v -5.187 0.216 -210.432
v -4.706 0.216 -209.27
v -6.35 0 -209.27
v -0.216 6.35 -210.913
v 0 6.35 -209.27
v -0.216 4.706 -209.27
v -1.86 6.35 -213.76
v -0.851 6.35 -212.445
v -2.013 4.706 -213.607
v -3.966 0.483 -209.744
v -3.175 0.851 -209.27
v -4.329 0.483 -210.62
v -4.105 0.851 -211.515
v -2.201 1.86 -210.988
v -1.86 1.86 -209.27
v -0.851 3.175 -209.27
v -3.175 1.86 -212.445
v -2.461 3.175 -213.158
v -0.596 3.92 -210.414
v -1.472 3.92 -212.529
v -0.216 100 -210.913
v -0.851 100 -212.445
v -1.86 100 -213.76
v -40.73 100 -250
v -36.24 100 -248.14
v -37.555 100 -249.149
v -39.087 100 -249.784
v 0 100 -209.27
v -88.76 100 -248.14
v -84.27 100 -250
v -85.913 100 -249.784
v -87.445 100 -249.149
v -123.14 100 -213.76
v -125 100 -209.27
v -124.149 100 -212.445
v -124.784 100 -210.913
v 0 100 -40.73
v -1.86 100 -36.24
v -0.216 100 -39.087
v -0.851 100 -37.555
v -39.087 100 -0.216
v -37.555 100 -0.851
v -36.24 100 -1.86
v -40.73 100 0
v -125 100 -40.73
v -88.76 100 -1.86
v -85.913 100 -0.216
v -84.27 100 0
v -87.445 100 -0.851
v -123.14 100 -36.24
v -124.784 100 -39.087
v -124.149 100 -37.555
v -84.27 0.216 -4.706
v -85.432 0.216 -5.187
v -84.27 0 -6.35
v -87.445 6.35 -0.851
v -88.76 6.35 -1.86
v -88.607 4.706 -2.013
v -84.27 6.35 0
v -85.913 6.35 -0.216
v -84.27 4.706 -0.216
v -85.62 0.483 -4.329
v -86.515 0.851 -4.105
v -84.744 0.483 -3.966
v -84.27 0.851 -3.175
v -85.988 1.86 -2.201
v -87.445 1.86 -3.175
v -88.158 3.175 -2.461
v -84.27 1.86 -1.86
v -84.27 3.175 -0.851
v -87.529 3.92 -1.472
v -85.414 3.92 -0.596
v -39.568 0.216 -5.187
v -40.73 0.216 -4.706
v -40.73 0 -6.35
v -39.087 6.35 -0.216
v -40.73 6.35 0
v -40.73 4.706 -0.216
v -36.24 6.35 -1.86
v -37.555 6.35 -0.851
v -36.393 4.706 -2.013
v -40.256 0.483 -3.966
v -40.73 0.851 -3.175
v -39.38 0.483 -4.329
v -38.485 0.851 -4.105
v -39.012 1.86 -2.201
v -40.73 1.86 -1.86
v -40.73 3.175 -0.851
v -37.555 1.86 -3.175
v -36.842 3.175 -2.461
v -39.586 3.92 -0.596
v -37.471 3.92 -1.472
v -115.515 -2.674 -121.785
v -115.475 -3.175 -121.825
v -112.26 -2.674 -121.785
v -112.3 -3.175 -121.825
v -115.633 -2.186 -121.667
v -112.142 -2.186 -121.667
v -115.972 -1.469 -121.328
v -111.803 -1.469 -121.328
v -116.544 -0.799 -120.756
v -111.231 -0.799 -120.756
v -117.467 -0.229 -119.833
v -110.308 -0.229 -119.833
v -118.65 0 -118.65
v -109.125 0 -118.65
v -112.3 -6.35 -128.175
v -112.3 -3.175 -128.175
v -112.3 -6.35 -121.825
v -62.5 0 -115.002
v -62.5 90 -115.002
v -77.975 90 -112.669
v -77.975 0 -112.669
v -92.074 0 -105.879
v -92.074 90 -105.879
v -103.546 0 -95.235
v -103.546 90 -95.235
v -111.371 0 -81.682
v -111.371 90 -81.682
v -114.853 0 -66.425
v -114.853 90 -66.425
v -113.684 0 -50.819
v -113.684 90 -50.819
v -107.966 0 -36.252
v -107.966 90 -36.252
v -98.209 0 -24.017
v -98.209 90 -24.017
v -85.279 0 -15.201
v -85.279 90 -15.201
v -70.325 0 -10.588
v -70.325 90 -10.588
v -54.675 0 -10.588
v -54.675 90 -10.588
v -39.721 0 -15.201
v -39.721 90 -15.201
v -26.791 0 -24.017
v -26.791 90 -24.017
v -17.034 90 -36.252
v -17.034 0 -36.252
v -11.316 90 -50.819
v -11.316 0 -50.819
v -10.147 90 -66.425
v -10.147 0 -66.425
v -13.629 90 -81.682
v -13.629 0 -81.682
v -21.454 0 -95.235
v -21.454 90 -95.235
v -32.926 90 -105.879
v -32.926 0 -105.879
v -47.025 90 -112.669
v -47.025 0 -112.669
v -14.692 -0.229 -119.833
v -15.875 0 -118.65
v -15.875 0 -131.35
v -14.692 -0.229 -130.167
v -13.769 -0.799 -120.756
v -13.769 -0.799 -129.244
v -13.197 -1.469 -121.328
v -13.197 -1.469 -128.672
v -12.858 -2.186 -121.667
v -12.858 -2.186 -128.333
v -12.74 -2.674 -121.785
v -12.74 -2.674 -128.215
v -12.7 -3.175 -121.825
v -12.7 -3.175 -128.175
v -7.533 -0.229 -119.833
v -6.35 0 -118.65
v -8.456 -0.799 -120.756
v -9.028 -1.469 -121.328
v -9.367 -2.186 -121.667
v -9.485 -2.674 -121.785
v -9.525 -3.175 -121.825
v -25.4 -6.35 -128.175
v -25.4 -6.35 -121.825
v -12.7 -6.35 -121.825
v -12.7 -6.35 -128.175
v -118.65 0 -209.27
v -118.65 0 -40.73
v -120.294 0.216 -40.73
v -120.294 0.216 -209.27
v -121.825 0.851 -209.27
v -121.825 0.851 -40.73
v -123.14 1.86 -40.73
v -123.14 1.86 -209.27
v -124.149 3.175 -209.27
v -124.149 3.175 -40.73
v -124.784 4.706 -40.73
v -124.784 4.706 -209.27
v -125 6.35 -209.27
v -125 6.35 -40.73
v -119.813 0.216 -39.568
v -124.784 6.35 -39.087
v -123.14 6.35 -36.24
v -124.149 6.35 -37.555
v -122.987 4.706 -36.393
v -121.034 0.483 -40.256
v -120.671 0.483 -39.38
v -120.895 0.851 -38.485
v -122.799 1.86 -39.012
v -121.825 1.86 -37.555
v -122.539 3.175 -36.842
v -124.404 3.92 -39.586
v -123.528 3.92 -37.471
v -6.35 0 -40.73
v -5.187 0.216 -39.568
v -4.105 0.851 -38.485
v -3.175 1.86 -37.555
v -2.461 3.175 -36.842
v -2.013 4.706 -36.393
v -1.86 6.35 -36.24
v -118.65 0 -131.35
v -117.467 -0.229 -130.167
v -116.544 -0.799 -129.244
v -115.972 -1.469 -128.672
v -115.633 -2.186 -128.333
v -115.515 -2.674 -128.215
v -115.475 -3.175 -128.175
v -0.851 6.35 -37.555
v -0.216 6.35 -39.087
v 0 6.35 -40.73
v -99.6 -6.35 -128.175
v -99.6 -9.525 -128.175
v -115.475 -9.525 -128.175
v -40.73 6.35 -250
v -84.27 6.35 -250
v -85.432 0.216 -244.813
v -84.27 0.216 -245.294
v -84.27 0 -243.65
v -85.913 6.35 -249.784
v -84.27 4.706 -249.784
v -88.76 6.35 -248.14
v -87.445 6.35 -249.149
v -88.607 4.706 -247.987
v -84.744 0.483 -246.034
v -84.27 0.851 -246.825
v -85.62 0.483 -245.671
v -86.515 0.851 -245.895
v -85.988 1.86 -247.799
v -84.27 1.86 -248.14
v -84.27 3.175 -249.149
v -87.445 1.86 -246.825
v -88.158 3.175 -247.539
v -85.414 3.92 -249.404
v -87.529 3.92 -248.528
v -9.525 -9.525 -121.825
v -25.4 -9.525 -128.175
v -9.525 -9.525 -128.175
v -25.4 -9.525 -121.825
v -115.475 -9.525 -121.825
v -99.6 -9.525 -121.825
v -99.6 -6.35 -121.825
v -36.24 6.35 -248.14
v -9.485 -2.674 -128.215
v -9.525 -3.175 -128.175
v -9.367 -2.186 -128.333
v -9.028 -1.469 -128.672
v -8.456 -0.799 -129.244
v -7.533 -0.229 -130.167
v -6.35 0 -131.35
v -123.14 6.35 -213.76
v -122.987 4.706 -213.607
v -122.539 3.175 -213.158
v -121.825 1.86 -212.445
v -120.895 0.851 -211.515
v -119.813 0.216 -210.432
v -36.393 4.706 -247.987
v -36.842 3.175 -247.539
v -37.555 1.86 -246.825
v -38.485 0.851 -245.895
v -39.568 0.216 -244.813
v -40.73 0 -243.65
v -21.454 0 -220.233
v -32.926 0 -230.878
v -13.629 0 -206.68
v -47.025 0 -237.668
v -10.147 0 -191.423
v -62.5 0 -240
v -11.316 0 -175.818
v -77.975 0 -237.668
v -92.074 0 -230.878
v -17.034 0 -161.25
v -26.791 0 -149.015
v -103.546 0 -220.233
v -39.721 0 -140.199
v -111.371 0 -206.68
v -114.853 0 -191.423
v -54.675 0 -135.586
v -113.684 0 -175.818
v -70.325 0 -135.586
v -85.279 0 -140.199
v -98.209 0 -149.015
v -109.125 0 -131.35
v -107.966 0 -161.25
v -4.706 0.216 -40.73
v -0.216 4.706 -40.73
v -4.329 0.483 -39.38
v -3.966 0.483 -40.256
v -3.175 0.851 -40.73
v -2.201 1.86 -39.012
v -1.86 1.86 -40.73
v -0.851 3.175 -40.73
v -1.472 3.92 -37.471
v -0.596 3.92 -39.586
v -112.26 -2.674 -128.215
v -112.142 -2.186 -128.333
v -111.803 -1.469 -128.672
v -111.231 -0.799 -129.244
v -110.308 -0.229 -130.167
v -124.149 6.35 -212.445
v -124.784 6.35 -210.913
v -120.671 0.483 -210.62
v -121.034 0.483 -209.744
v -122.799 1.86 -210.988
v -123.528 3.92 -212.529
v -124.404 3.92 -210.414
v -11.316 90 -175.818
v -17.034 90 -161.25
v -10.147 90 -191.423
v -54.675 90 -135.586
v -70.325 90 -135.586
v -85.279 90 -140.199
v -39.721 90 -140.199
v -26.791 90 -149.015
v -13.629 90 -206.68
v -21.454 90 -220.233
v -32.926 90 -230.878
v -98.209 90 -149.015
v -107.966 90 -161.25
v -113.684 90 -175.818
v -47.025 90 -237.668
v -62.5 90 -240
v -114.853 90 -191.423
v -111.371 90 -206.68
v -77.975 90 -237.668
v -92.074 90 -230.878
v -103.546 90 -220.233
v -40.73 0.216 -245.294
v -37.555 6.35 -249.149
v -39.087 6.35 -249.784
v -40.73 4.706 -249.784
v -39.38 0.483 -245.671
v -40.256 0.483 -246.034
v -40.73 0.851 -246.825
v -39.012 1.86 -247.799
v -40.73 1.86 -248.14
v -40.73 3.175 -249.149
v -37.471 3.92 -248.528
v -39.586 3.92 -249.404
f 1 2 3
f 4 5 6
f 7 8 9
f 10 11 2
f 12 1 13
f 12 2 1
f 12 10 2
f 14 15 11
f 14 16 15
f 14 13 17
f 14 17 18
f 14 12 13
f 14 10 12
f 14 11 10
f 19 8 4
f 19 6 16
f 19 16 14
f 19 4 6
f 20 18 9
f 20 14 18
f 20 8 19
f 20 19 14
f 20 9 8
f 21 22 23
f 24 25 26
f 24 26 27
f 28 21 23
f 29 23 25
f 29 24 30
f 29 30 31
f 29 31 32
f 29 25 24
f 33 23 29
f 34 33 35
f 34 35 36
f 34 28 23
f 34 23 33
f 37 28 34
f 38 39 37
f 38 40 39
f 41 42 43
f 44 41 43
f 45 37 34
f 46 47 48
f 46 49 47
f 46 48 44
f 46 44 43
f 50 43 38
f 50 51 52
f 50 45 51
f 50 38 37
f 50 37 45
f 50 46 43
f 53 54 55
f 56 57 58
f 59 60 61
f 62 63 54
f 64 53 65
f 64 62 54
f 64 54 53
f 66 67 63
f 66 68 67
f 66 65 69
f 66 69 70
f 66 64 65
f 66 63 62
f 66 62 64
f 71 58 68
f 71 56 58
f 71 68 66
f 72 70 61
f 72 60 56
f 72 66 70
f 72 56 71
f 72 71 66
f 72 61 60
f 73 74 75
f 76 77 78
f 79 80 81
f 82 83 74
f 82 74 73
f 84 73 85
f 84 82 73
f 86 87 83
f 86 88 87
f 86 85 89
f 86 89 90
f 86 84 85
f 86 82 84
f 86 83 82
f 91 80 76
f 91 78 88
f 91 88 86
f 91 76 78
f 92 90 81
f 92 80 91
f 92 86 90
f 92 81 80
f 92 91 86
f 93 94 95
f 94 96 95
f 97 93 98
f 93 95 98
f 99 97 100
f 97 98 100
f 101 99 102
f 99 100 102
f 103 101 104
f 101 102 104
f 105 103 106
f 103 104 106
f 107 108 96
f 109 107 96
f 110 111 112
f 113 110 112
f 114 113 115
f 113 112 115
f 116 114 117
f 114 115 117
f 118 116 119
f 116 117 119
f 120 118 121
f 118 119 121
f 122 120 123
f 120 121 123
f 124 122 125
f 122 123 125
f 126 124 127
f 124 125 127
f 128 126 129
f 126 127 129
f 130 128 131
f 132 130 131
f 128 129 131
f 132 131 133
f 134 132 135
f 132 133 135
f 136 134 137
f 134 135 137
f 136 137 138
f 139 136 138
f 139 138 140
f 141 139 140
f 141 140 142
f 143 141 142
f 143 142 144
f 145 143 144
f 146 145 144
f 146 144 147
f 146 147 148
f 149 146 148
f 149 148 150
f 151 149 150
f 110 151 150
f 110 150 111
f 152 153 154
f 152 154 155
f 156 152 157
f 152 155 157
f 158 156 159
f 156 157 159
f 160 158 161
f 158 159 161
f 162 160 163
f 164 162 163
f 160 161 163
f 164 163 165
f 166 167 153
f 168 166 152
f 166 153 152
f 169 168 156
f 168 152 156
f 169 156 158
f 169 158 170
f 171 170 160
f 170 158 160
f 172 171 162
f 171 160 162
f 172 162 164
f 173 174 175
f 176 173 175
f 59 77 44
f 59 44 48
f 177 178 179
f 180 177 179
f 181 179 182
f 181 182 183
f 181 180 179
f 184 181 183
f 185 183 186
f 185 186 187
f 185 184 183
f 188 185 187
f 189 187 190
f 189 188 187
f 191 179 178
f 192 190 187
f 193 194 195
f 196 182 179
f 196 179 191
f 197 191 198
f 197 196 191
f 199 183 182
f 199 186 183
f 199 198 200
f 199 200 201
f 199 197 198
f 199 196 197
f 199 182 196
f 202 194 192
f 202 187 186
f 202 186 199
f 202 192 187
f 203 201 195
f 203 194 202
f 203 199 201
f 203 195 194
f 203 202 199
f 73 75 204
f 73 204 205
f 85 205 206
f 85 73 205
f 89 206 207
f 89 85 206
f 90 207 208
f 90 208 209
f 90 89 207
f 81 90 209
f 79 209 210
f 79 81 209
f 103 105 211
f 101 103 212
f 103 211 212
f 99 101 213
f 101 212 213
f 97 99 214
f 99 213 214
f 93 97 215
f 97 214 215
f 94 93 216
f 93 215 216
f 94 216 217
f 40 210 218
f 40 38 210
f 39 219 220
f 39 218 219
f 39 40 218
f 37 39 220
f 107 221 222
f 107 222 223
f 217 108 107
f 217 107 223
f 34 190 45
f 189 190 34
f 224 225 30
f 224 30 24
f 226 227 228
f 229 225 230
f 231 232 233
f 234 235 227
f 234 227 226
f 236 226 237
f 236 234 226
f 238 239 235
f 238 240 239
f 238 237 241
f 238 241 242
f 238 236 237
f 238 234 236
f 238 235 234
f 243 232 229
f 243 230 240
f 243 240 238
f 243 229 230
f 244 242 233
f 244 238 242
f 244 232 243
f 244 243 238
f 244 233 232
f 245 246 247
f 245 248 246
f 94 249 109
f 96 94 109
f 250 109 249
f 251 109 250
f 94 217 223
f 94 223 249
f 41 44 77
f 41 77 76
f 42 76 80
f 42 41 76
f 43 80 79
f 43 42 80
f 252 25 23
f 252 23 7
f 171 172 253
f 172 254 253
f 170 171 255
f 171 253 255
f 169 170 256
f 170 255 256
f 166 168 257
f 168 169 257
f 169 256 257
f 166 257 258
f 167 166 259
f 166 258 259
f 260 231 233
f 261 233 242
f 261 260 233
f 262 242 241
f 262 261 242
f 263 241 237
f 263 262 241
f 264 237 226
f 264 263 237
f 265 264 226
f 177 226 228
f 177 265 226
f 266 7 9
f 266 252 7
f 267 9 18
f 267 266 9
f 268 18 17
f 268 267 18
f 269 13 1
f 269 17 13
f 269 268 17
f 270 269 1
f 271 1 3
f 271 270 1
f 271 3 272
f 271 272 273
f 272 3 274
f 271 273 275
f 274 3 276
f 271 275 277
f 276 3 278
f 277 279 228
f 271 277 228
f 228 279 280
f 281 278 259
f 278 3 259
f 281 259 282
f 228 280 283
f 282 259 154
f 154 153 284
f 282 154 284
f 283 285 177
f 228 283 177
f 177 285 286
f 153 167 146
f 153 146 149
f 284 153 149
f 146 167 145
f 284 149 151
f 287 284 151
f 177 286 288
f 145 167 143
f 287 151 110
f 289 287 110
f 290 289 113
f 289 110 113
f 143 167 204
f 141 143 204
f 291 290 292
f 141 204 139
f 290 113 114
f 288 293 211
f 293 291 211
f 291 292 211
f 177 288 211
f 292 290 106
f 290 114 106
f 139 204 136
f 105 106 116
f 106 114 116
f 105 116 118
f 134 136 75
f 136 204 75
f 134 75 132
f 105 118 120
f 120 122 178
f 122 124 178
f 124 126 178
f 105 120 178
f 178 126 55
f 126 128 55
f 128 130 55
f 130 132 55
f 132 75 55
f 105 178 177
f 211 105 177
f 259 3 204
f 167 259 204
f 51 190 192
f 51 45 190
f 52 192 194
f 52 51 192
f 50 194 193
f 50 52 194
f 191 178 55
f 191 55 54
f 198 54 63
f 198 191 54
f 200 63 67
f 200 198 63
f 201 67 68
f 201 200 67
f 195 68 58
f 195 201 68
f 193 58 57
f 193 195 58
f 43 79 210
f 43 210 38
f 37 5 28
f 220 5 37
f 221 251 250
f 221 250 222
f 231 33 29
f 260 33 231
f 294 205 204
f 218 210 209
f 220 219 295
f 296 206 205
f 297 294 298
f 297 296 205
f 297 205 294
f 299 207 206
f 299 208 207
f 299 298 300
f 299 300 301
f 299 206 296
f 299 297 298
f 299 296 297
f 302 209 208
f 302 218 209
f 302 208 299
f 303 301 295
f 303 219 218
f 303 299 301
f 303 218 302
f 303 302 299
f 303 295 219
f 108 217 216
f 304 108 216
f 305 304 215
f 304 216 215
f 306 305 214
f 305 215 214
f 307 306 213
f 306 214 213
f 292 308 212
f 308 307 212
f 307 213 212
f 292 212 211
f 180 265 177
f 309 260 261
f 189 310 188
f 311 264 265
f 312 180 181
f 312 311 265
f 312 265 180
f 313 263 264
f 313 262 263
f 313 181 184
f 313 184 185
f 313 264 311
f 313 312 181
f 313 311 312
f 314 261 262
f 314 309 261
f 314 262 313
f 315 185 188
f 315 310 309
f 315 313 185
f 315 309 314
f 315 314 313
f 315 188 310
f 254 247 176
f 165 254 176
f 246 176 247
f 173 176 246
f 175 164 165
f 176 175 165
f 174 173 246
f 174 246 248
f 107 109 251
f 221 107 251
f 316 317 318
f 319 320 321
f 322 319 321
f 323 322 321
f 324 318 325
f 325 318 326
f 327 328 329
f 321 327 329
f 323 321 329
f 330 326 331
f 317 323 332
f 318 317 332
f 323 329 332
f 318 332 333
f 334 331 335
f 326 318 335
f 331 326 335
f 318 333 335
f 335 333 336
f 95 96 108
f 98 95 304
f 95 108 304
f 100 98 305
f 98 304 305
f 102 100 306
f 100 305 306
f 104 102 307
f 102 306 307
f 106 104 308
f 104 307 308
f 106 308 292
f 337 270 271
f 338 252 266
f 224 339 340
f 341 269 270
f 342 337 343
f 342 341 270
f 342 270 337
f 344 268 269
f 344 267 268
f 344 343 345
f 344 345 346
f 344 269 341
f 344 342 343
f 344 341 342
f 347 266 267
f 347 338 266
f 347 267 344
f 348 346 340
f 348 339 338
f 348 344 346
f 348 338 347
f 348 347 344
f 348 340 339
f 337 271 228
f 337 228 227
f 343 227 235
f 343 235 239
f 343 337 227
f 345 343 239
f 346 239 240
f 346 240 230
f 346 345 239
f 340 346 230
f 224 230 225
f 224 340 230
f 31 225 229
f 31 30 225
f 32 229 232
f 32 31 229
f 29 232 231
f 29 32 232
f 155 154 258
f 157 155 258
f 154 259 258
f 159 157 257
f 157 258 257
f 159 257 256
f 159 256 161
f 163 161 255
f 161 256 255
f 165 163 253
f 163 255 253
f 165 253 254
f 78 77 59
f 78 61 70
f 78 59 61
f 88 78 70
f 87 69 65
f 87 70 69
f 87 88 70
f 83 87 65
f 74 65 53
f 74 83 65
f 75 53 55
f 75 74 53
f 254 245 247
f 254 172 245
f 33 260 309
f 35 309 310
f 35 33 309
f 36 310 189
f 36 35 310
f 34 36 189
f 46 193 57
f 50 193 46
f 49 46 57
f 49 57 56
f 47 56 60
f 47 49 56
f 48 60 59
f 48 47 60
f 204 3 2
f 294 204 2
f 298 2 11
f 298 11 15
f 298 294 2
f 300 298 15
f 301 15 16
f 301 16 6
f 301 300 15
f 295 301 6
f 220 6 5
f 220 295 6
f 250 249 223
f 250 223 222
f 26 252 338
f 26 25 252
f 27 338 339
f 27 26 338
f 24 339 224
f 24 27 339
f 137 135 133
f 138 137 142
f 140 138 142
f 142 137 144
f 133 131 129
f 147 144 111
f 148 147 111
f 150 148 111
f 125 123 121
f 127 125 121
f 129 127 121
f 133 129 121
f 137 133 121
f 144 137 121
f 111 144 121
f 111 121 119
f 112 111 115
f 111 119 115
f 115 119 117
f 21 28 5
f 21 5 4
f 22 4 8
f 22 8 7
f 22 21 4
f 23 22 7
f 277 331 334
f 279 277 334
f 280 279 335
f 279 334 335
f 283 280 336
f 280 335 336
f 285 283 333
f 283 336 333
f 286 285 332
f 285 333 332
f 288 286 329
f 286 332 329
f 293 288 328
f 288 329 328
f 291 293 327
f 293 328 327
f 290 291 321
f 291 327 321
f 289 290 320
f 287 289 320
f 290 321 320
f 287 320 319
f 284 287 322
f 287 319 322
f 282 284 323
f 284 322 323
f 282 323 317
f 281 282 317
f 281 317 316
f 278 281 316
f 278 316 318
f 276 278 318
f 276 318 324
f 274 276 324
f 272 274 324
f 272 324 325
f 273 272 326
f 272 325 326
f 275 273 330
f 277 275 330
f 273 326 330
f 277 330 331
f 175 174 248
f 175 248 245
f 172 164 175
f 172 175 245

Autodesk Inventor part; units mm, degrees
ref_plane "YZ Plane" through (0, 0, 0) normal (1, 0, 0) x (0, 1, 0)
ref_plane "XZ Plane" through (0, 0, 0) normal (0, 1, 0) x (-1, 0, 0)
ref_plane "XY Plane" through (0, 0, 0) normal (0, 0, 1) x (1, 0, 0)
sketch "Sketch1" plane through (0, 0, 0) normal (0, 1, 0) x (-1, 0, 0)
  line L0 (0, 0) -> (125, 0)
  line L1 (125, 0) -> (125, -250)
  line L2 (125, -250) -> (0, -250)
  line L3 (0, -250) -> (0, 0)
  line L4 (62.5, -250) -> (62.5, -240)
  line L5 (62.5, -240) -> (62.5, -187.5)
  line L6 (62.5, 0) -> (62.5, -10)
  line L7 (62.5, -10) -> (62.5, -62.5018)
  dimension "d0" = 125
  dimension "d1" = 250
  dimension "d2" = 10
  dimension "d3" = 52.5
  dimension "d4" = 10
  dimension "d5" = 52.5018
extrude "Extrusion1" add sketch "Sketch1" along normal blind 100
hole "Hole1" at (-62.5, 0, -62.5018) at (-62.5, 0, -187.5) direction (0, 1, 0) diameter 105 depth 90
sketch "Sketch2" plane through (0, 0, 0) normal (0, -1, 0) x (1, 0, 0)
  line L0 (-125, -250) -> (-125, 0) projected
  line L1 (-125, -125) -> (-112.3, -125)
  line L2 (-112.3, -125) -> (-112.3, -121.825)
  line L3 (-112.3, -121.825) -> (-99.6, -121.825)
  line L4 (-99.6, -121.825) -> (-99.6, -128.175)
  line L5 (-99.6, -128.175) -> (-112.3, -128.175)
  line L6 (-112.3, -128.175) -> (-112.3, -121.825)
  line L7 (-112.3, -128.175) -> (-115.475, -128.175)
  line L8 (-115.475, -128.175) -> (-115.475, -121.825)
  line L9 (-115.475, -121.825) -> (-112.3, -121.825)
  line L10 (-112.3, -121.825) -> (-112.3, -128.175)
  point P0 (0, 0)
  dimension "d16" = 12.7
  dimension "d17" = 3.175
  dimension "d18" = 12.7
  dimension "d19" = 6.35
  dimension "d20" = 3.175
extrude "Extrusion2" add sketch "Sketch2" along normal blind 6.35 contours L8 L9 L2 L1 | L1 L6 L7 L8
sketch "Sketch3" plane through (0, -6.35, 0) normal (0, -1, 0) x (1, 0, 0)
  line L0 (-112.3, -128.175) -> (-112.3, -121.825) projected
  line L1 (-112.3, -121.825) -> (-99.6, -121.825)
  line L2 (-99.6, -121.825) -> (-99.6, -128.175)
  line L3 (-99.6, -128.175) -> (-112.3, -128.175)
  line L4 (-112.3, -128.175) -> (-112.3, -121.825)
  line L5 (-115.475, -128.175) -> (-115.475, -121.825) projected
  line L6 (-115.475, -121.825) -> (-112.3, -121.825)
  line L7 (-112.3, -121.825) -> (-112.3, -128.175)
  line L8 (-112.3, -128.175) -> (-115.475, -128.175)
  line L9 (-115.475, -128.175) -> (-115.475, -121.825)
  point P0 (0, 0)
  dimension "d23" = 12.7
extrude "Extrusion3" add sketch "Sketch3" along normal blind 3.175
fillet "Fillet2" radius 3.175 4 edges at (-115.475, 0, -125) (-113.8875, 0, -128.175) (-113.8875, 0, -121.825) (-112.3, 0, -125)
ref_plane "Work Plane1" through (-62.5, 0, -250) normal (-1, 0, 0) x (0, 0, 1)
mirror "Mirror1" about plane through (-62.5, 0, -250) normal (-1, 0, 0) of "Extrusion2", "Extrusion3", "Fillet2"
chamfer "Chamfer1" distance 38.1 angle 45 4 edges at (-125, 50, 0) (0, 50, 0) (0, 50, -250) (-125, 50, -250)
fillet "Fillet1" radius 6.35 16 edges at (-125, 0, -125) (-62.5, 0, 0) (0, 0, -125) (-62.5, 0, -250) (-105.95, 0, -19.05) (-19.05, 0, -19.05) (-19.05, 0, -230.95) (-105.95, 0, -230.95) (-125, 50, -38.1) (-86.9, 50, 0) (-38.1, 50, 0) (0, 50, -38.1) (0, 50, -211.9) (-86.9, 50, -250) (-125, 50, -211.9) (-38.1, 50, -250)
properties part number "Bottle Holder"
